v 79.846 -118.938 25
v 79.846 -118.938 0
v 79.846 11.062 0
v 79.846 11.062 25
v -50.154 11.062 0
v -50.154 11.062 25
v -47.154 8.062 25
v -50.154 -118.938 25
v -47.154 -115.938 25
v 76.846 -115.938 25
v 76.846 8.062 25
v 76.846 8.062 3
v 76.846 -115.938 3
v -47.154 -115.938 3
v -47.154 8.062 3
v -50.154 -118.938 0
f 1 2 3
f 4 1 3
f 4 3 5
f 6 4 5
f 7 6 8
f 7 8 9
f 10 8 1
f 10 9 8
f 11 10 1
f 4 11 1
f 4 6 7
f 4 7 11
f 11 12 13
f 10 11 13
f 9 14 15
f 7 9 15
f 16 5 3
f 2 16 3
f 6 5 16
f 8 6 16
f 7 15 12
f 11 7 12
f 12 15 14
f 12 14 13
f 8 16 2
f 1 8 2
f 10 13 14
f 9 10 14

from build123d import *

# Parameters (mm, degrees)
F1_DEPTH = 25
F0_W     = 124
F0_H     = 124
F2_DEPTH = 3


with BuildPart() as f1:
    # F0 (on Top) → F1 (new body)
    with BuildSketch(Plane.XY):
        Polygon((47.188934, 11.061991), (-47.153505, 11.061991), (-47.153505, 8.061991), (76.846495, 8.061991), (76.846495, 11.061991), (57.846495, 11.061991), align=None)
        Polygon((-47.153505, 11.061991), (-50.153505, 11.061991), (-50.153505, 9.061991), (-50.153505, -116.938009), (-50.153505, -118.938009), (-47.153505, -118.938009), (-47.153505, -115.938009), (-47.153505, 8.061991), align=None)
        Polygon((76.846495, -115.938009), (-47.153505, -115.938009), (-47.153505, -118.938009), (47.188934, -118.938009), (76.846495, -118.938009), align=None)
        Polygon((76.846495, 11.061991), (76.846495, 8.061991), (76.846495, -115.938009), (76.846495, -118.938009), (79.846495, -118.938009), (79.846495, -116.938009), (79.846495, 11.061991), align=None)
    extrude(amount=F1_DEPTH)

    # F0 (on Top) → F2 (join)
    with BuildSketch(Plane.XY):
        with Locations((14.846495, -53.938009)):
            Rectangle(F0_W, F0_H)
    extrude(amount=F2_DEPTH)


solid = f1.part
